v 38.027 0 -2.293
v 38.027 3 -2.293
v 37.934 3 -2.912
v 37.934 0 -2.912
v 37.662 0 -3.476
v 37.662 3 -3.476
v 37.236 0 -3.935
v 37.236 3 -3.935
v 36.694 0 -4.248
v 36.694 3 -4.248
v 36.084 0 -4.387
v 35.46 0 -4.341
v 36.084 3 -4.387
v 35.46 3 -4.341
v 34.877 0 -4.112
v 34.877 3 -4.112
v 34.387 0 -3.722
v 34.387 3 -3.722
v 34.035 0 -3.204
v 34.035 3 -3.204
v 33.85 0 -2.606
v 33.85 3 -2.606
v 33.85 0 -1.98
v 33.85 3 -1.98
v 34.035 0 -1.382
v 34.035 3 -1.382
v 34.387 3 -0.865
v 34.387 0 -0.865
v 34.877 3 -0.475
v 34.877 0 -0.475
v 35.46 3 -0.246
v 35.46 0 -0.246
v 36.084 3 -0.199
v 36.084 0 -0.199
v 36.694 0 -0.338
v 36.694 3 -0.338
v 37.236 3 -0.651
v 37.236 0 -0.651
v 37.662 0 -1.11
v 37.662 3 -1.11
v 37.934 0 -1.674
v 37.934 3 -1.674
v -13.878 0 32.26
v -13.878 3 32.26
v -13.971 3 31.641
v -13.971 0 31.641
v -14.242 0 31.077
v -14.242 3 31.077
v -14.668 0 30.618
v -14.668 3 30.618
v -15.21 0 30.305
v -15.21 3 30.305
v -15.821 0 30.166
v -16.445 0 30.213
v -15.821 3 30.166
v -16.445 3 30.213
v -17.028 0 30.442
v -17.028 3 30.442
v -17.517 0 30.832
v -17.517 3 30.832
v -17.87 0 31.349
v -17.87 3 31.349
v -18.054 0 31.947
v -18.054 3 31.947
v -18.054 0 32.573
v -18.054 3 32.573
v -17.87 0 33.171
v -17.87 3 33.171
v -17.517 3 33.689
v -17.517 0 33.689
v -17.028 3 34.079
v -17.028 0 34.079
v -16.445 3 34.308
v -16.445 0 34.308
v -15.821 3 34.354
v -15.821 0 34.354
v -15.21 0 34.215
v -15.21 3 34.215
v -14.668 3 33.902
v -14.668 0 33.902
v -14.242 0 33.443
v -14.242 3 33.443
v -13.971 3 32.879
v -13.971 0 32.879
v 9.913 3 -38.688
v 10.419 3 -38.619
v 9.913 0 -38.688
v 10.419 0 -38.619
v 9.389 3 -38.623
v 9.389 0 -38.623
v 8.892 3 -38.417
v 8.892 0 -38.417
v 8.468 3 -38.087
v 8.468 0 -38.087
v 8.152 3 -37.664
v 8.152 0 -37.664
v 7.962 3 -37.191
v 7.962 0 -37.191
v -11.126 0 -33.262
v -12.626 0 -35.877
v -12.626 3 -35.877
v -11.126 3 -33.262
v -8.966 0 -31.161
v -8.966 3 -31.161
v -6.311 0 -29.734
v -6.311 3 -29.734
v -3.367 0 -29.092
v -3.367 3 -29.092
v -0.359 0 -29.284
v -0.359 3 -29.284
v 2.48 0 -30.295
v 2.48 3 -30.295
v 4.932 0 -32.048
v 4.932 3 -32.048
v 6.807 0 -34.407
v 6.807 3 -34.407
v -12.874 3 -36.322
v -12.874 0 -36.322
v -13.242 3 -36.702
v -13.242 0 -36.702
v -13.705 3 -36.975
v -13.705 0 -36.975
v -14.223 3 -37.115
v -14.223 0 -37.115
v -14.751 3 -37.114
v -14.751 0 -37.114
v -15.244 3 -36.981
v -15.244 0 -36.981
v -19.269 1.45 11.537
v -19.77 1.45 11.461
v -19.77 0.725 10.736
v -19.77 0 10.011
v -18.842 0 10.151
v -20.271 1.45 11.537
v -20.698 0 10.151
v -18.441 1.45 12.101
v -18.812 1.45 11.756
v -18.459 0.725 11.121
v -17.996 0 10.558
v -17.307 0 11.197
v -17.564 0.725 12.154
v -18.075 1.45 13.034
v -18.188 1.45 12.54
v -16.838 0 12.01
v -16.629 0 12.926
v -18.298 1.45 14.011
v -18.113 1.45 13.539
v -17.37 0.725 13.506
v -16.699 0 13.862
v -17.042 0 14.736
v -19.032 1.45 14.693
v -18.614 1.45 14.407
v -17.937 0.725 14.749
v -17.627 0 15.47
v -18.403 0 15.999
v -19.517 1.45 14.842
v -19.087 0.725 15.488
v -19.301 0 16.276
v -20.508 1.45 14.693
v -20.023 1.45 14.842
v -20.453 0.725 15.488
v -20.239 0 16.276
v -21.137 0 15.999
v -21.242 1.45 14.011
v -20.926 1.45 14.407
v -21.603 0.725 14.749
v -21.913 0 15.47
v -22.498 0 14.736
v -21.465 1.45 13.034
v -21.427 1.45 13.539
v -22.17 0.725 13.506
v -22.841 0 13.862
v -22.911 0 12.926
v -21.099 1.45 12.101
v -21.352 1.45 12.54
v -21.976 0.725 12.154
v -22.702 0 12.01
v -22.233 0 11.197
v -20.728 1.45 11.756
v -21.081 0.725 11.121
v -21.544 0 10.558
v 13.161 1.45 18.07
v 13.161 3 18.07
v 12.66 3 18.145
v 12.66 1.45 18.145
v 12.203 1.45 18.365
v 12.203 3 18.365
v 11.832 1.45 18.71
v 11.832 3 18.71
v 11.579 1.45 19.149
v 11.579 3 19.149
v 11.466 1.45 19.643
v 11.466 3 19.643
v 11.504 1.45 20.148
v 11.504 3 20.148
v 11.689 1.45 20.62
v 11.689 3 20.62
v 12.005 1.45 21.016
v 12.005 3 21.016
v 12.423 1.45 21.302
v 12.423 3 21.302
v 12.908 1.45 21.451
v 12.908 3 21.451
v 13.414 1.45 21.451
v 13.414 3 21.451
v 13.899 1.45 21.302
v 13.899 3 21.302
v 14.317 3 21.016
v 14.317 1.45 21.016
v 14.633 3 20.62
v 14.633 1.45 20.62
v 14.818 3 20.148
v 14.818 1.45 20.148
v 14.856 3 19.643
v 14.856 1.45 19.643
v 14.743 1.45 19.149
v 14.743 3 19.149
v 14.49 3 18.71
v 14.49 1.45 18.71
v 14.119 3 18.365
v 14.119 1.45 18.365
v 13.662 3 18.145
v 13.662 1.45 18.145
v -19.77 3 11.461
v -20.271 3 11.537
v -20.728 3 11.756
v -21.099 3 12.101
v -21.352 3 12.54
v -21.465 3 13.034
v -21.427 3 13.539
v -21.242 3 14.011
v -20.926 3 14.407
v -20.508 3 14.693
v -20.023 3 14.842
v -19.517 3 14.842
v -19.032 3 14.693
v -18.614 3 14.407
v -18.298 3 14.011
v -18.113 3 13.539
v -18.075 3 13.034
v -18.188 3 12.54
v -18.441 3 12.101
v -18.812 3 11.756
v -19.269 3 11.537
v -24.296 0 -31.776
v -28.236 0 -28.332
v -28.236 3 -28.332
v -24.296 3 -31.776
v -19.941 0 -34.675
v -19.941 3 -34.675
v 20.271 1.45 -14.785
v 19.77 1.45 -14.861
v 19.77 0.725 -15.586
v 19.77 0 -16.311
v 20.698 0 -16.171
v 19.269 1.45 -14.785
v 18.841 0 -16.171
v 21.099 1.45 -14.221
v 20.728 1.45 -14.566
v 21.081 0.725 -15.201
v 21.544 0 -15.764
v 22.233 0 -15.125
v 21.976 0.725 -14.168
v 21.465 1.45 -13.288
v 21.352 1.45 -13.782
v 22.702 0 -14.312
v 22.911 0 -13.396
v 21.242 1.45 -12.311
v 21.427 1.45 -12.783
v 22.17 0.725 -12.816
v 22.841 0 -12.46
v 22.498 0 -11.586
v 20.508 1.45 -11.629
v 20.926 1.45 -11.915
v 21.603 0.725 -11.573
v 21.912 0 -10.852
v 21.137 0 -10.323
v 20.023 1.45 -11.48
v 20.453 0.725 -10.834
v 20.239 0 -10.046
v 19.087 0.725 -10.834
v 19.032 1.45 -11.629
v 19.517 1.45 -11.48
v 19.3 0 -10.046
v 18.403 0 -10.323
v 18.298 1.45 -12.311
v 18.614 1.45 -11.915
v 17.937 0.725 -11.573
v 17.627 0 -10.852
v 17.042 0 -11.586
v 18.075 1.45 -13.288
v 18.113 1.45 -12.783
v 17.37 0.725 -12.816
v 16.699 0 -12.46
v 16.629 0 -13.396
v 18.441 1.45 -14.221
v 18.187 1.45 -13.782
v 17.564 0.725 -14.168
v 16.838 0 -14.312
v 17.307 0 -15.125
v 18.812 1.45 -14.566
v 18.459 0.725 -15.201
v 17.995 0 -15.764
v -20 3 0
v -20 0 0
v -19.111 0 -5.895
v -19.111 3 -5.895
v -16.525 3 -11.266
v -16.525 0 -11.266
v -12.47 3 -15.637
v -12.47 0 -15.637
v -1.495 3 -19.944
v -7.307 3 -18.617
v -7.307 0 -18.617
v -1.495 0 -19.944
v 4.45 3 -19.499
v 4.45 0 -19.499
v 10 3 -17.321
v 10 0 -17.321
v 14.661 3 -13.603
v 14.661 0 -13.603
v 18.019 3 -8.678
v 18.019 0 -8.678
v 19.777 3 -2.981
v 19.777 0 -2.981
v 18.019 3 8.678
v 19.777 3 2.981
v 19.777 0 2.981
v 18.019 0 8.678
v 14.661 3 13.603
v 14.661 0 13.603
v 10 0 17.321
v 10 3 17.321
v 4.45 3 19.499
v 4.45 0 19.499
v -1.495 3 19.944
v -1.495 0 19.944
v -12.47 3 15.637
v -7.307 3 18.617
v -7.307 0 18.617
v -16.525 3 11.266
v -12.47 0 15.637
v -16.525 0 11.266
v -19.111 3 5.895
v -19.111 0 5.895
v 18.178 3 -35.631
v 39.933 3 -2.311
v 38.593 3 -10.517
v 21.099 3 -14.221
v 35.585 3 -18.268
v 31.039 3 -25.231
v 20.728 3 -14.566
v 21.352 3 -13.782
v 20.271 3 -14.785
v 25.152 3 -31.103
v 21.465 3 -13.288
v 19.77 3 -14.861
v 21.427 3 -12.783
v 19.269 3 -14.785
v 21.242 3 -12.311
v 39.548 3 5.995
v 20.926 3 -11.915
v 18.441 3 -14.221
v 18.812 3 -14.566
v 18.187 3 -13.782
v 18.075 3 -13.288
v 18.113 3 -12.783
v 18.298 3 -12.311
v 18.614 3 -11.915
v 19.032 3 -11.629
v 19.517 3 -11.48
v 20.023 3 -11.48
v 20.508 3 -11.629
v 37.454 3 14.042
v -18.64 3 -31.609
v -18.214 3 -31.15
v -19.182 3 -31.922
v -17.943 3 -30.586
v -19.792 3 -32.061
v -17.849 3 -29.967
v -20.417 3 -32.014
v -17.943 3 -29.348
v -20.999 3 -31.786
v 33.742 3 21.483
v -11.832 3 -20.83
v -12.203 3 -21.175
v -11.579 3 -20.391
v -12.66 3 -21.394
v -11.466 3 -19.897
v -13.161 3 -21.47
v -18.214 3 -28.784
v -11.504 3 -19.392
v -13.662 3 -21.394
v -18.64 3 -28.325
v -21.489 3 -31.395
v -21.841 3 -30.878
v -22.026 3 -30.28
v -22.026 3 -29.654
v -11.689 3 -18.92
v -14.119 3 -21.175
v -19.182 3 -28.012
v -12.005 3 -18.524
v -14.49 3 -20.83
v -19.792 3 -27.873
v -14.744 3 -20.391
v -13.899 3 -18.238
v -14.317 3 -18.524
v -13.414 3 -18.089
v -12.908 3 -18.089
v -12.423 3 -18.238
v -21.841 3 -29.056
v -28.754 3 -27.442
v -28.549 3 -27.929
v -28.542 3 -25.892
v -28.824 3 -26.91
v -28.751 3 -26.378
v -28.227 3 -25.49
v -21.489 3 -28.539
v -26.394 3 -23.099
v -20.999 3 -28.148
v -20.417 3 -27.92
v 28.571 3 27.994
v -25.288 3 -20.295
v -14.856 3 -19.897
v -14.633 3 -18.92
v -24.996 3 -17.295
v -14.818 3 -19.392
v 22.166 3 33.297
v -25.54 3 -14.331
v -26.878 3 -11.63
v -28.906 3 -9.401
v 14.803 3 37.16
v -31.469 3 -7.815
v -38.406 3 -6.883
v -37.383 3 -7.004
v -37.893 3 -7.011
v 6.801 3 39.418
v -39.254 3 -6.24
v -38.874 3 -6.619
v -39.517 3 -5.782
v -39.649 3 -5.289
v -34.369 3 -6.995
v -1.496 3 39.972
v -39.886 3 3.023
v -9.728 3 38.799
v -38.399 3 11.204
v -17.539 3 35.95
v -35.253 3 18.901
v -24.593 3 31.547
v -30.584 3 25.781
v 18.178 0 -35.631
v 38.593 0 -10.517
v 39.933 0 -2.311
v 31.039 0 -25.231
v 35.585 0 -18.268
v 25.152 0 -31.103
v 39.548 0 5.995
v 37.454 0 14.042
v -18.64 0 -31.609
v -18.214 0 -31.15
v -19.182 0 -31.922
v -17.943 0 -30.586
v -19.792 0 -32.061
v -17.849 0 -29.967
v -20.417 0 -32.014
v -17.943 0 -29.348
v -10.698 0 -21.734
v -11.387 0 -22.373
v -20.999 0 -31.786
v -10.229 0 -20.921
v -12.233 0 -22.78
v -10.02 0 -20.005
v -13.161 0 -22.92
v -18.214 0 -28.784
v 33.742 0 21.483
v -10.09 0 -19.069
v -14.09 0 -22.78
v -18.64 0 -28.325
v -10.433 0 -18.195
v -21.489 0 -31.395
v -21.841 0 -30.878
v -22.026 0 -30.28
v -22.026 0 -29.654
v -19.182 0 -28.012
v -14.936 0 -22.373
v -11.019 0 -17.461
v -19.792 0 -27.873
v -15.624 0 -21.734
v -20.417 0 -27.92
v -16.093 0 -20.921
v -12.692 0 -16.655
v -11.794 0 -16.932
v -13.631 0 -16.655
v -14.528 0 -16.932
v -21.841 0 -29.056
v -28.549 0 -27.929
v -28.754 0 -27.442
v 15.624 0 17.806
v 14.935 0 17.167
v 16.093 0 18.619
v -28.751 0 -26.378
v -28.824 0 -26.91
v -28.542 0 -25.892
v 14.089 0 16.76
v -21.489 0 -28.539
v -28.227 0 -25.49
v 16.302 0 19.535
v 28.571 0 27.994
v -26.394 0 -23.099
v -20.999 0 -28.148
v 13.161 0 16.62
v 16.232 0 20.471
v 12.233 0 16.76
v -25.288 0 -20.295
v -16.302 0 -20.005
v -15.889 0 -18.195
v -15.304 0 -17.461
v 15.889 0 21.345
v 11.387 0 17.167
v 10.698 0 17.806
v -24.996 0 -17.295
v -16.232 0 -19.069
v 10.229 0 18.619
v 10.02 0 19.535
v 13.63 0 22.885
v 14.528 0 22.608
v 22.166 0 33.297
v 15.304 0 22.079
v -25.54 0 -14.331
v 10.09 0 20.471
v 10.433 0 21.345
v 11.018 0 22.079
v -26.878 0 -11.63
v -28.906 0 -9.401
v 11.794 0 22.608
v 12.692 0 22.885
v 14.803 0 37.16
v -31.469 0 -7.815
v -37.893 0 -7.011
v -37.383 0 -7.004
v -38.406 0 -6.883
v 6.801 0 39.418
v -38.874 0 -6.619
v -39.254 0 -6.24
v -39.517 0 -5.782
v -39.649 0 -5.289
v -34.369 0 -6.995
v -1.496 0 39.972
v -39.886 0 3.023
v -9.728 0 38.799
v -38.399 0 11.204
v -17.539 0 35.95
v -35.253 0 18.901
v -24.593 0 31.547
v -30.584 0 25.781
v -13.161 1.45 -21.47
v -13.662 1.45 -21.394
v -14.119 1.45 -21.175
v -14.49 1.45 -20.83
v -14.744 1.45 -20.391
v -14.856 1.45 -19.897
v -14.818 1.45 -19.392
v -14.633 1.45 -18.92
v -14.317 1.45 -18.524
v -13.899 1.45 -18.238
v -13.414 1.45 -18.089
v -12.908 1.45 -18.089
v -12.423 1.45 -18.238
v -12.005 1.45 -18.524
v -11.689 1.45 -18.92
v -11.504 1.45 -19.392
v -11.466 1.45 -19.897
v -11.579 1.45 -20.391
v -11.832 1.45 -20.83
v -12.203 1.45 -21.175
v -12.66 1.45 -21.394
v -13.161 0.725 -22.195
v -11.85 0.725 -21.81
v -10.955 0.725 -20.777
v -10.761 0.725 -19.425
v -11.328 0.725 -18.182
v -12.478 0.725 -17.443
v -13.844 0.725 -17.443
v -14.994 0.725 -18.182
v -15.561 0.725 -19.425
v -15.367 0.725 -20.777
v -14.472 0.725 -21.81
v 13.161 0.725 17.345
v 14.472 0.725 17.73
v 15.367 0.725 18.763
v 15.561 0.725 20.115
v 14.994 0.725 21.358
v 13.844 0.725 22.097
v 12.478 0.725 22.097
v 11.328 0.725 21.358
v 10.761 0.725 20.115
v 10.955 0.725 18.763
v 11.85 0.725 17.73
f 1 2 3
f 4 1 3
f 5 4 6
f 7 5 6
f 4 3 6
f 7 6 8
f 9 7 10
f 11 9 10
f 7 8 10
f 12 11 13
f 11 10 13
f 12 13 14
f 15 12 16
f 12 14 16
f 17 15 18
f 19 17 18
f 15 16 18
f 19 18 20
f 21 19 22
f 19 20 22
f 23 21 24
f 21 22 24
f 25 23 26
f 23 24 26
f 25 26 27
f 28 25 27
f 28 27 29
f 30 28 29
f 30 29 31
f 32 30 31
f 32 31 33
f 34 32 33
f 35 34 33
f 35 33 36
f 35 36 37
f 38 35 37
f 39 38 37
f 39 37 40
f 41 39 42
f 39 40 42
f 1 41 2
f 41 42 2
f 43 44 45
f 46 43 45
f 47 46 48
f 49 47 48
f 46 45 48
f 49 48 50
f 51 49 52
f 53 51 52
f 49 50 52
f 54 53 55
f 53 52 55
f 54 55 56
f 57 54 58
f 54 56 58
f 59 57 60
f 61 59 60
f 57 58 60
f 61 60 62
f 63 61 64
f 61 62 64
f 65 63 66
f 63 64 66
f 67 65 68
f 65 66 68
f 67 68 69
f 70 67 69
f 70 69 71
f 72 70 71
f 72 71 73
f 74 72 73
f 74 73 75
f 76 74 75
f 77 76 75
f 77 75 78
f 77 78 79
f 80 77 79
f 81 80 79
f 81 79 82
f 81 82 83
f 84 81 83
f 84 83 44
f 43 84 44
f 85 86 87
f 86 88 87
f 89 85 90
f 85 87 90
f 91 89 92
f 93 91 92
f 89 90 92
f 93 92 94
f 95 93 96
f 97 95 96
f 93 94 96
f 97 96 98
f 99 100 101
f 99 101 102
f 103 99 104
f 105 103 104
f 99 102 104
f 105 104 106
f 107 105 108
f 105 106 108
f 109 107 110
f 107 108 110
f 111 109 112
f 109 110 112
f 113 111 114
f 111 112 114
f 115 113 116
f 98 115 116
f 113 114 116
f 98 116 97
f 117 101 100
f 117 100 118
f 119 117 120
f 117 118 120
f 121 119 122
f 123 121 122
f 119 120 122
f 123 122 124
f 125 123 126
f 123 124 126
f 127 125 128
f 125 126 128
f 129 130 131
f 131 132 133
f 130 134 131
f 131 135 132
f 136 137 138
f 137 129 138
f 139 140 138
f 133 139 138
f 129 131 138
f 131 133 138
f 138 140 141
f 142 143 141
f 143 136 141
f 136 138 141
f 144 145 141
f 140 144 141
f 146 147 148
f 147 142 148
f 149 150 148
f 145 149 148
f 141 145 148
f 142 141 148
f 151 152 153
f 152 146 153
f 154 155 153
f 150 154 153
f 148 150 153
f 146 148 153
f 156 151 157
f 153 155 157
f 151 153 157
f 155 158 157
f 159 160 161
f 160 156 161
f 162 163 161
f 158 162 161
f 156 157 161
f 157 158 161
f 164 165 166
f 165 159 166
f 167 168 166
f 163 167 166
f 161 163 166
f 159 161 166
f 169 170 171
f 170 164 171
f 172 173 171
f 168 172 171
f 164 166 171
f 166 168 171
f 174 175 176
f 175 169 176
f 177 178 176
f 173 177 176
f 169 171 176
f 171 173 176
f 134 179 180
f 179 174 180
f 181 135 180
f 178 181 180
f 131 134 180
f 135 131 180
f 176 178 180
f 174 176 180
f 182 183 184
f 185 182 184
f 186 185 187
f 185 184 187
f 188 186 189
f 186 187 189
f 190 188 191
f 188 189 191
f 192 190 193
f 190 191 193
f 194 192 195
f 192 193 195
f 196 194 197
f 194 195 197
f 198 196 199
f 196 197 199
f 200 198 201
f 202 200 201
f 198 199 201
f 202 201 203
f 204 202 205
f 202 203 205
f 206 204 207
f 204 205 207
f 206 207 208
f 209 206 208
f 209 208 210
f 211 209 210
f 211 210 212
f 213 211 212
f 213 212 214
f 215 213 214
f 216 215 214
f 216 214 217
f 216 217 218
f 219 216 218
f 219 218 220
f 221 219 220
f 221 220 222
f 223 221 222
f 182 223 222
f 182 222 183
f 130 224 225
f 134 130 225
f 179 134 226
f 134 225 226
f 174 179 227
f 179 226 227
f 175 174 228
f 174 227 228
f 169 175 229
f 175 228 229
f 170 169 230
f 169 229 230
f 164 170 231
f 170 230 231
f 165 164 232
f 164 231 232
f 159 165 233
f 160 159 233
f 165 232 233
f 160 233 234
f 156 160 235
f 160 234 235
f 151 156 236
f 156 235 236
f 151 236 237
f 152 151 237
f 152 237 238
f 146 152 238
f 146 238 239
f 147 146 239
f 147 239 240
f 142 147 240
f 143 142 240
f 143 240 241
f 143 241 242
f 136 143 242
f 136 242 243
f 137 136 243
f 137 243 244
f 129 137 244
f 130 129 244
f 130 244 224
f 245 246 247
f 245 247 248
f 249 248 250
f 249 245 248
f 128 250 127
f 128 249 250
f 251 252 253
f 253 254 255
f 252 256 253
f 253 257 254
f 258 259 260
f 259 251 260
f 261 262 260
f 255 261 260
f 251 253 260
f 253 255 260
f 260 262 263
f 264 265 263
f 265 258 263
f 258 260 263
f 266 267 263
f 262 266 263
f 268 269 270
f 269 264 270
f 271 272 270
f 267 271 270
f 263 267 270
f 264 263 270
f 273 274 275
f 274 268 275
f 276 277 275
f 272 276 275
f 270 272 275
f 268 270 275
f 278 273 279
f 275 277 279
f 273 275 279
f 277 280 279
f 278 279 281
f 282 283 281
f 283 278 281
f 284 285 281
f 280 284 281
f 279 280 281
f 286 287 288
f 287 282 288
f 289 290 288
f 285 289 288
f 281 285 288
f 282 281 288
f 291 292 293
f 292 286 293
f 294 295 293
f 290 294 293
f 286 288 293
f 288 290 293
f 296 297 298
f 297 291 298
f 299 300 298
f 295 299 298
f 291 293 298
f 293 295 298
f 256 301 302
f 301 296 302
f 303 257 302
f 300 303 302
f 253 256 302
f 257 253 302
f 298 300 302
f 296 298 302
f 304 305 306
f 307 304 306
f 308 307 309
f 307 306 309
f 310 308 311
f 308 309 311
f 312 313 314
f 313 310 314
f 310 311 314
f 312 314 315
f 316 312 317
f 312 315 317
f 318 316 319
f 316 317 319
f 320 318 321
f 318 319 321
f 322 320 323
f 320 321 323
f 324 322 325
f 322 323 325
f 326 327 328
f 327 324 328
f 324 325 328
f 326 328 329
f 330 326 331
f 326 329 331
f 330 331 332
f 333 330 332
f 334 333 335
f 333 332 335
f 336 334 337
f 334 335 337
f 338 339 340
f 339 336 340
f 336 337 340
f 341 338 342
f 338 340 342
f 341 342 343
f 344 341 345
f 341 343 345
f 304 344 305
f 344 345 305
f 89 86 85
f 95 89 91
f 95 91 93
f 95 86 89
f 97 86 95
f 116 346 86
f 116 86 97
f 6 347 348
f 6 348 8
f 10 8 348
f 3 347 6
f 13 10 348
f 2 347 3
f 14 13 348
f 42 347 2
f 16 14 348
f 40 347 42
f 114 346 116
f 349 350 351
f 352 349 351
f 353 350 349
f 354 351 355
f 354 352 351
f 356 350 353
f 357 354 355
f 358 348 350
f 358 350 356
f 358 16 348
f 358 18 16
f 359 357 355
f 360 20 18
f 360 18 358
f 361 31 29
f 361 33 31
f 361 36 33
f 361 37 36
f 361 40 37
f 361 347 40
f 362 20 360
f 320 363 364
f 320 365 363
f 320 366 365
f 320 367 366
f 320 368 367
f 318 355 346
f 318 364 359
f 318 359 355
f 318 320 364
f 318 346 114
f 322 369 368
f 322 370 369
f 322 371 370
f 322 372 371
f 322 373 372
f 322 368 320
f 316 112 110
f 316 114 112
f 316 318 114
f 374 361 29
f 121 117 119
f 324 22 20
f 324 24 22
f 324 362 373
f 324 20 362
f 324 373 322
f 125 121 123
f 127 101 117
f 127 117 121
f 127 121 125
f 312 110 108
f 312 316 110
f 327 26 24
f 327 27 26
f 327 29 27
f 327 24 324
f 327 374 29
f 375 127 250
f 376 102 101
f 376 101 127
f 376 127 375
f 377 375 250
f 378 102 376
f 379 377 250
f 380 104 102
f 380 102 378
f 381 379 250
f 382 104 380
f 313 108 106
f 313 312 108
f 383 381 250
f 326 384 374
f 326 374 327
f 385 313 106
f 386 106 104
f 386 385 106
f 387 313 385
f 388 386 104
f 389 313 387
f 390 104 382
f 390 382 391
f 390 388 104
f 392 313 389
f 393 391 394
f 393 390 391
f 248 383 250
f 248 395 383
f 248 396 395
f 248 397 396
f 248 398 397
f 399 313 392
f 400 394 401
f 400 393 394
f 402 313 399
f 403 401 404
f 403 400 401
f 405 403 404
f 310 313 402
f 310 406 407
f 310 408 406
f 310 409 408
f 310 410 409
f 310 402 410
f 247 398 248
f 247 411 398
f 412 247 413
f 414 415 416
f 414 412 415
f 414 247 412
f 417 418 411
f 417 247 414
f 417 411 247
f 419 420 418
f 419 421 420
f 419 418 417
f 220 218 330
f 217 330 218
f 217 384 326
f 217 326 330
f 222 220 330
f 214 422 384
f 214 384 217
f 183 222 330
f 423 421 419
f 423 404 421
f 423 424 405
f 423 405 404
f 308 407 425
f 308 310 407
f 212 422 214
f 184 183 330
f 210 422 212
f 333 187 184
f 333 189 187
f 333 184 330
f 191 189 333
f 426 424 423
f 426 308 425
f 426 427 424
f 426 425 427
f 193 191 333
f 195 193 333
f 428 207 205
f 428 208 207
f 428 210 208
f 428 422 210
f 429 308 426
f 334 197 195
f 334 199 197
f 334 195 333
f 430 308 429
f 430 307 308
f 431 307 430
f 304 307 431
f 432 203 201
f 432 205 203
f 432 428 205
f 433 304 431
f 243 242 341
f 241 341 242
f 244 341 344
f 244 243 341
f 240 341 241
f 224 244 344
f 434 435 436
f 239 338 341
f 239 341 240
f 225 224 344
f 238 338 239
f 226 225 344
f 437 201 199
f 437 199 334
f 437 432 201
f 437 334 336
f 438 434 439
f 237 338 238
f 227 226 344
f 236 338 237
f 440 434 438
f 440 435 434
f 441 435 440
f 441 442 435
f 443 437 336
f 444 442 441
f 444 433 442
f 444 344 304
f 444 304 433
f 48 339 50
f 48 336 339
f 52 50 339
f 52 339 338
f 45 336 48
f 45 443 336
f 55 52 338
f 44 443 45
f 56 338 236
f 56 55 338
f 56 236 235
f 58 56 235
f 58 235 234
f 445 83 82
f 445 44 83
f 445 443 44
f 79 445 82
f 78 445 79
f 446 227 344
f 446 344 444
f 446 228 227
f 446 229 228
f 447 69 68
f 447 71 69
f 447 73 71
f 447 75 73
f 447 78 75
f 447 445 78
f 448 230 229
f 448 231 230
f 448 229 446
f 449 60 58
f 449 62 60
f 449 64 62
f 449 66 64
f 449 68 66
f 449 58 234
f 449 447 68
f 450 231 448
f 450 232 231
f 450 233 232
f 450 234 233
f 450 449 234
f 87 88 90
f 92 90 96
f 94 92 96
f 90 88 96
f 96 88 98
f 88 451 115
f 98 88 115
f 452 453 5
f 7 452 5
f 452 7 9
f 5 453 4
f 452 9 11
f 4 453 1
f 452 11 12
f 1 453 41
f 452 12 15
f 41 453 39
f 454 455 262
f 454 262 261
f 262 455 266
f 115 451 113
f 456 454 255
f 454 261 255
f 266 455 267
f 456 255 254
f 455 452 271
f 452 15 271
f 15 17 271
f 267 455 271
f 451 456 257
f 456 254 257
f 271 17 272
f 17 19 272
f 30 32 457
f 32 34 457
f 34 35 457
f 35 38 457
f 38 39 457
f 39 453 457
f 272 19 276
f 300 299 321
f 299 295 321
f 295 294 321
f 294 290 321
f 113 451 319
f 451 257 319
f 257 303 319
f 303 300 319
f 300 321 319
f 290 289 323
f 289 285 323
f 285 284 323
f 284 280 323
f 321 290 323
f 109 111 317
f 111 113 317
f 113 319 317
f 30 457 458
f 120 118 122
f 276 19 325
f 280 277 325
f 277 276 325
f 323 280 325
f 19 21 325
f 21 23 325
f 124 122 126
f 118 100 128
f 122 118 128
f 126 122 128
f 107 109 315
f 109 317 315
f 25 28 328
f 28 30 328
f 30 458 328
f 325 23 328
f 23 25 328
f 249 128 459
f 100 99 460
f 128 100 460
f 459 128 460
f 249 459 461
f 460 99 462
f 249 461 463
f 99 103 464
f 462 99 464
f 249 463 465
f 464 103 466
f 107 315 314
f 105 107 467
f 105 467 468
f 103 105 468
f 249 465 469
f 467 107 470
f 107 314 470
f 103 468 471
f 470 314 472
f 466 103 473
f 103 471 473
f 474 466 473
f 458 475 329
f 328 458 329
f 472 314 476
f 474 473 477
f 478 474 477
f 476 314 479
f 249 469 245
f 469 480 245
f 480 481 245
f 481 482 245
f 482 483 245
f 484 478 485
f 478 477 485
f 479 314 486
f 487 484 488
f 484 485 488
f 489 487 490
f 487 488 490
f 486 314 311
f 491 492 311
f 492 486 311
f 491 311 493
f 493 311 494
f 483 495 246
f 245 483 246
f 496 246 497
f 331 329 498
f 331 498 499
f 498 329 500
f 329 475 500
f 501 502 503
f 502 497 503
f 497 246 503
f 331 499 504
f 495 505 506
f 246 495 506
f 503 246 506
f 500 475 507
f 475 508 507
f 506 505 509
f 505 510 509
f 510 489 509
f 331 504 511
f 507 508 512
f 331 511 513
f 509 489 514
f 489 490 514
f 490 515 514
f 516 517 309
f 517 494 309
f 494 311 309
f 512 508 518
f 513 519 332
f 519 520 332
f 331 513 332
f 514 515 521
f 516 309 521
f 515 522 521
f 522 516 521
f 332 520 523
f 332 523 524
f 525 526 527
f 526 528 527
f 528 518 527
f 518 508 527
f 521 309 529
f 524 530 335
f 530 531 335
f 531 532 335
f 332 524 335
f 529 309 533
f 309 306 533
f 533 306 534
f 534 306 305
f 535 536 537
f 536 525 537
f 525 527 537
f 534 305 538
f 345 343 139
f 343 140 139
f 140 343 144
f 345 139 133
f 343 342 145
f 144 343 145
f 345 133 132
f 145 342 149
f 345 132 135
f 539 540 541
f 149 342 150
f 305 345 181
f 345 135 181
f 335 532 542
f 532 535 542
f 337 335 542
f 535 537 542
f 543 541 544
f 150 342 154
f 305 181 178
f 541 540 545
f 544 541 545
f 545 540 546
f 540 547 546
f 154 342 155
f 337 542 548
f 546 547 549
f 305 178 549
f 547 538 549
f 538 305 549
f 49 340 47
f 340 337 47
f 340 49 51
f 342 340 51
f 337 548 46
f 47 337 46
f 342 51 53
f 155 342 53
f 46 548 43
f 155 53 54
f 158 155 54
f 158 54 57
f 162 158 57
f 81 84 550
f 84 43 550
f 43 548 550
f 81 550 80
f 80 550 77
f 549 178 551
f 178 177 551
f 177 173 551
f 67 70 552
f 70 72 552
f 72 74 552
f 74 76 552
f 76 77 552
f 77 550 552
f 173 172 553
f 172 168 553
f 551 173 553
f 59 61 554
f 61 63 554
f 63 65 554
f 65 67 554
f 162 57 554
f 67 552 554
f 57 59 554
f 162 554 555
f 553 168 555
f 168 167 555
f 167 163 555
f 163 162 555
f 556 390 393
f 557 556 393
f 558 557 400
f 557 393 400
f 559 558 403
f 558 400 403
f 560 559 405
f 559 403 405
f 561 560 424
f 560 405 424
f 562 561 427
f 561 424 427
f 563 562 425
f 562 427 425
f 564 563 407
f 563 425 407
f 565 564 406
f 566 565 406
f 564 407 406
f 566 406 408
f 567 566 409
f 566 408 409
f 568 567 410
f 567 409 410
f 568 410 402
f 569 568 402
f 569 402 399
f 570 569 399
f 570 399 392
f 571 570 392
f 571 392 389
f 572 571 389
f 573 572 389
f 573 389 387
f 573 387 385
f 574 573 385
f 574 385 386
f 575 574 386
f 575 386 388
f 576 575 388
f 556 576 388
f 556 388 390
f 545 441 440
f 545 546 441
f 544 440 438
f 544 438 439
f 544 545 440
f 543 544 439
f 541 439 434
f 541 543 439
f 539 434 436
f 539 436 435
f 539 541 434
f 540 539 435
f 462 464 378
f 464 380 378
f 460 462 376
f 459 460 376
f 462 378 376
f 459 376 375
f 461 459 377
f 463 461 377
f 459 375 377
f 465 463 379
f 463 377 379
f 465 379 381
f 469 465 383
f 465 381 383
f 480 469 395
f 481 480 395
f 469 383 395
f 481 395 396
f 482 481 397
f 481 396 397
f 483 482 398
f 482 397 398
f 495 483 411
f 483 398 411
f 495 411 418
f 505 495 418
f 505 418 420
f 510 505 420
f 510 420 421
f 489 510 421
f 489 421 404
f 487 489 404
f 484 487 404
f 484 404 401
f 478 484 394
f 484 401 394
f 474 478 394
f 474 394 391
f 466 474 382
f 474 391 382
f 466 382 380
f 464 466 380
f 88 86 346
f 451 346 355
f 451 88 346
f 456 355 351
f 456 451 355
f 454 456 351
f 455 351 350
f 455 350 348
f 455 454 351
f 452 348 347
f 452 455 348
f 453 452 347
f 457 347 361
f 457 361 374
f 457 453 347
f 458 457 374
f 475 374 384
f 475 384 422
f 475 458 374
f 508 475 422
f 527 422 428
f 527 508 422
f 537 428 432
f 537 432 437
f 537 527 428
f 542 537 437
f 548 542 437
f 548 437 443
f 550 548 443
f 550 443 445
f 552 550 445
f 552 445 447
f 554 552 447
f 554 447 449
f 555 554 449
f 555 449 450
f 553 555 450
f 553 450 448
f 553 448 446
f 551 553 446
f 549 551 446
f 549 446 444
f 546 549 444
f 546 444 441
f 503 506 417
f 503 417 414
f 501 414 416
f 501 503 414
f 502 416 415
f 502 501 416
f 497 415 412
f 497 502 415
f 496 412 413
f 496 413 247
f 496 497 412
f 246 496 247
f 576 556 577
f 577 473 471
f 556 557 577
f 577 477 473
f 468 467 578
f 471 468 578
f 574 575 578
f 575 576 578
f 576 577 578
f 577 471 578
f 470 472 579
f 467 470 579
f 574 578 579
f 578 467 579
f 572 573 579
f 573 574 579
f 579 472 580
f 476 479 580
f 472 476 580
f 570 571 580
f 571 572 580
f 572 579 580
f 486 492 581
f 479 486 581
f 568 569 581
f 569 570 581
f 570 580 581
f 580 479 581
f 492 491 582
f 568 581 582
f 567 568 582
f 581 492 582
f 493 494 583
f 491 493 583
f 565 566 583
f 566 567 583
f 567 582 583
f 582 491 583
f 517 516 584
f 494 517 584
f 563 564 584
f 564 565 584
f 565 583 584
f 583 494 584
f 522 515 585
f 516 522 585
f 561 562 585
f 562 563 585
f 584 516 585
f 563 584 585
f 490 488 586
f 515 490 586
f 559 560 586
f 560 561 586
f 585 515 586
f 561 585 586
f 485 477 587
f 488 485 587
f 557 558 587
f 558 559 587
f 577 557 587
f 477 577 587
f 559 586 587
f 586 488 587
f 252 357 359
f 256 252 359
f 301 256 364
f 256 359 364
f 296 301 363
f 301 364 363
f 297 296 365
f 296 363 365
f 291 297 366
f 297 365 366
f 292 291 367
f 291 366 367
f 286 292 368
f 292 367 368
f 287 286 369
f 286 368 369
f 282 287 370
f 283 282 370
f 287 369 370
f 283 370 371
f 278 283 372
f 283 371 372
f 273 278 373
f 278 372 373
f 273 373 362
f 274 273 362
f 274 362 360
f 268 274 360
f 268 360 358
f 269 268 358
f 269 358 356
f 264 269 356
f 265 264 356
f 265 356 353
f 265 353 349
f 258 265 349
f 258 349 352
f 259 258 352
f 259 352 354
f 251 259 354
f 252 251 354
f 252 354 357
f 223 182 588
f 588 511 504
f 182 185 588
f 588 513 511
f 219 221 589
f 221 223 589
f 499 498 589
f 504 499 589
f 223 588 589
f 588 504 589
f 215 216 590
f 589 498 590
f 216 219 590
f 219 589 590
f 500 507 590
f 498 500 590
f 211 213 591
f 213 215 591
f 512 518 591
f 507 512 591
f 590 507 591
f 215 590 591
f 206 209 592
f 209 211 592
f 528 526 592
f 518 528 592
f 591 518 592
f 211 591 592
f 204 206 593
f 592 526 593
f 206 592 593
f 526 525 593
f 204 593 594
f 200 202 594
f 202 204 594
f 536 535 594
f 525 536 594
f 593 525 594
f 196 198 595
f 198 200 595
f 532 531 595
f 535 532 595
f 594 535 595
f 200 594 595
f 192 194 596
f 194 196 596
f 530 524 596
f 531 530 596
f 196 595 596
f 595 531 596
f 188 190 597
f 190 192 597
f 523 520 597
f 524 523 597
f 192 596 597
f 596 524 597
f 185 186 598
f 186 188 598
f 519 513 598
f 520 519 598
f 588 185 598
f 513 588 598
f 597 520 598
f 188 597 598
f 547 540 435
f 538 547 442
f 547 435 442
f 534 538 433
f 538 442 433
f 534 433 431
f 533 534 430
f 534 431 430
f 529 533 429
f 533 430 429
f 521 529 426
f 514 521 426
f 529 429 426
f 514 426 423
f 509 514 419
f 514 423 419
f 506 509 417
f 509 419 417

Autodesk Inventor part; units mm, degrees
ref_plane "YZ Plane" through (0, 0, 0) normal (1, 0, 0) x (0, 1, 0)
ref_plane "XZ Plane" through (0, 0, 0) normal (0, 1, 0) x (-1, 0, 0)
ref_plane "XY Plane" through (0, 0, 0) normal (0, 0, 1) x (1, 0, 0)
sketch "スケッチ1" plane through (0, 0, 0) normal (0, 1, 0) x (-1, 0, 0)
  circle A0 centre (0, 0) radius 20
  circle A1 centre (0, 0) radius 40
  dimension "d0" = 40
  dimension "OD" = 80
extrude "押し出し1" add sketch "スケッチ1" along normal blind 3
sketch "スケッチ8" plane through (0, 0, 0) normal (0, -1, 0) x (1, 0, 0)
  circle A0 centre (-0.0001, 0) radius 23.75
  circle A1 centre (-27.2635, 37.05) radius 3.15 projected
  circle A2 centre (-38.2912, 25.4909) radius 3.15 projected
  circle A3 centre (25.4909, 38.2912) radius 5.525 projected
  circle A4 centre (41.2214, 20.4157) radius 5.525 projected
  circle A5 centre (38.2912, -25.4909) radius 4.65 projected
  circle A6 centre (-35.8447, -17.7527) radius 4.65 projected
  circle A7 centre (-2.548, -39.9188) radius 4.65 projected
  arc A8 (-4.7957, -75.1327) -> (4.7957, 75.1327) centre (0, 0) ccw projected
  arc A9 (4.7957, 75.1327) -> (-4.7957, -75.1327) centre (0, 0) ccw projected
  circle A10 centre (-16.7482, -62.9346) radius 4.2164 projected
  circle A11 centre (-39.5574, -51.7347) radius 4.2164 projected
  circle A12 centre (-56.3443, -32.6587) radius 4.2164 projected
  circle A13 centre (-64.5532, -8.6107) radius 4.2164 projected
  circle A14 centre (-62.9346, 16.7482) radius 4.2164 projected
  circle A15 centre (-51.7347, 39.5574) radius 4.2164 projected
  circle A16 centre (-32.6587, 56.3443) radius 4.2164 projected
  circle A17 centre (-8.6107, 64.5532) radius 4.2164 projected
  circle A18 centre (16.7482, 62.9346) radius 4.2164 projected
  circle A19 centre (39.5574, 51.7347) radius 4.2164 projected
  circle A20 centre (56.3443, 32.6587) radius 4.2164 projected
  circle A21 centre (64.5532, 8.6107) radius 4.2164 projected
  circle A22 centre (62.9346, -16.7482) radius 4.2164 projected
  circle A23 centre (51.7347, -39.5574) radius 4.2164 projected
  circle A24 centre (32.6587, -56.3443) radius 4.2164 projected
  circle A25 centre (8.6107, -64.5532) radius 4.2164 projected
  circle A26 centre (-29.3091, 1.8708) radius 2.7051 projected
  circle A27 centre (-16.2747, -24.447) radius 2.7051 projected
  circle A28 centre (13.0344, -26.3178) radius 2.7051 projected
  circle A29 centre (29.3091, -1.8708) radius 2.7051 projected
  circle A30 centre (16.2747, 24.447) radius 2.7051 projected
  circle A31 centre (-13.0344, 26.3178) radius 2.7051 projected
  ellipse E0 centre (0.0001, 0) end of major axis (24.6134, -1.5711) minor radius 24.6634 (1.5711, 24.6133) -> (-1.5711, -24.6133) ccw projected
  ellipse E1 centre (-0.0001, 0) end of major axis (24.6133, -1.5711) minor radius 24.6634 (-1.5711, -24.6133) -> (1.5711, 24.6133) ccw projected
  line L0 (-16.2747, -24.447) -> (-0.0001, 0) construction
  line L1 (19.7699, -13.161) -> (-19.77, 13.161) construction
  point P0 (13.161, 19.7699)
  point P1 (-13.1611, -19.7699)
  dimension "d88" = 47.5
hole "穴3" at (-19.77, 0, 13.161) at (13.161, 0, 19.7699) at (19.7699, 0, -13.161) at (-13.1611, 0, -19.7699) direction (0, 1, 0) diameter 3.4 depth 3 countersink diameter 6.3 countersink angle 90
sketch "Sketch11" plane through (0, 3, 0) normal (0, 1, 0) x (1, 0, 0)
  circle A0 centre (-2.548, 39.9188) radius 6.6 projected
  circle A1 centre (-35.8447, 17.7527) radius 6.858 projected
  circle A2 centre (-35.8447, 17.7527) radius 10.858
  circle A3 centre (-2.548, 39.9188) radius 10.858
  point P0 (0, 0)
  dimension "d71" = 4
extrude "Extrusion5" cut sketch "Sketch11" against normal through all contours A0 | A1 | A2 | A3
sketch "Sketch13" plane through (0, 3, 0) normal (0, 1, 0) x (1, 0, 0)
  circle A0 centre (-19.9494, 29.967) radius 2.1
  circle A1 centre (35.9269, 2.2932) radius 2.1
  circle A2 centre (-15.9775, -32.2602) radius 2.1
  circle A3 centre (0, 0) radius 36 construction
  arc A4 (-13.1898, 37.7628) -> (8.2815, 39.1333) centre (-2.548, 39.9188) ccw projected
  arc A5 (-39.2984, 7.4587) -> (-29.7497, 26.7387) centre (-35.8447, 17.7527) ccw projected
  line L0 (-2.548, 39.9188) -> (-35.8447, 17.7527) construction
  line L1 (-19.1963, 28.8358) -> (0, 0) construction
  line L2 (0, 0) -> (35.9269, 2.2932) construction
  line L3 (0, 0) -> (-15.9775, -32.2602) construction
  dimension "d83" = 72
  dimension "d84" = 4.2
  dimension "d85" = 120
  dimension "d86" = 120
extrude "Extrusion7" cut sketch "Sketch13" against normal through all
fillet "Fillet2" radius 2 4 edges at (-39.2984, 1.5, -7.4587) (-29.7497, 1.5, -26.7387) (8.2815, 1.5, -39.1333) (-13.1898, 1.5, -37.7628)
properties part number "cathode_jig"
